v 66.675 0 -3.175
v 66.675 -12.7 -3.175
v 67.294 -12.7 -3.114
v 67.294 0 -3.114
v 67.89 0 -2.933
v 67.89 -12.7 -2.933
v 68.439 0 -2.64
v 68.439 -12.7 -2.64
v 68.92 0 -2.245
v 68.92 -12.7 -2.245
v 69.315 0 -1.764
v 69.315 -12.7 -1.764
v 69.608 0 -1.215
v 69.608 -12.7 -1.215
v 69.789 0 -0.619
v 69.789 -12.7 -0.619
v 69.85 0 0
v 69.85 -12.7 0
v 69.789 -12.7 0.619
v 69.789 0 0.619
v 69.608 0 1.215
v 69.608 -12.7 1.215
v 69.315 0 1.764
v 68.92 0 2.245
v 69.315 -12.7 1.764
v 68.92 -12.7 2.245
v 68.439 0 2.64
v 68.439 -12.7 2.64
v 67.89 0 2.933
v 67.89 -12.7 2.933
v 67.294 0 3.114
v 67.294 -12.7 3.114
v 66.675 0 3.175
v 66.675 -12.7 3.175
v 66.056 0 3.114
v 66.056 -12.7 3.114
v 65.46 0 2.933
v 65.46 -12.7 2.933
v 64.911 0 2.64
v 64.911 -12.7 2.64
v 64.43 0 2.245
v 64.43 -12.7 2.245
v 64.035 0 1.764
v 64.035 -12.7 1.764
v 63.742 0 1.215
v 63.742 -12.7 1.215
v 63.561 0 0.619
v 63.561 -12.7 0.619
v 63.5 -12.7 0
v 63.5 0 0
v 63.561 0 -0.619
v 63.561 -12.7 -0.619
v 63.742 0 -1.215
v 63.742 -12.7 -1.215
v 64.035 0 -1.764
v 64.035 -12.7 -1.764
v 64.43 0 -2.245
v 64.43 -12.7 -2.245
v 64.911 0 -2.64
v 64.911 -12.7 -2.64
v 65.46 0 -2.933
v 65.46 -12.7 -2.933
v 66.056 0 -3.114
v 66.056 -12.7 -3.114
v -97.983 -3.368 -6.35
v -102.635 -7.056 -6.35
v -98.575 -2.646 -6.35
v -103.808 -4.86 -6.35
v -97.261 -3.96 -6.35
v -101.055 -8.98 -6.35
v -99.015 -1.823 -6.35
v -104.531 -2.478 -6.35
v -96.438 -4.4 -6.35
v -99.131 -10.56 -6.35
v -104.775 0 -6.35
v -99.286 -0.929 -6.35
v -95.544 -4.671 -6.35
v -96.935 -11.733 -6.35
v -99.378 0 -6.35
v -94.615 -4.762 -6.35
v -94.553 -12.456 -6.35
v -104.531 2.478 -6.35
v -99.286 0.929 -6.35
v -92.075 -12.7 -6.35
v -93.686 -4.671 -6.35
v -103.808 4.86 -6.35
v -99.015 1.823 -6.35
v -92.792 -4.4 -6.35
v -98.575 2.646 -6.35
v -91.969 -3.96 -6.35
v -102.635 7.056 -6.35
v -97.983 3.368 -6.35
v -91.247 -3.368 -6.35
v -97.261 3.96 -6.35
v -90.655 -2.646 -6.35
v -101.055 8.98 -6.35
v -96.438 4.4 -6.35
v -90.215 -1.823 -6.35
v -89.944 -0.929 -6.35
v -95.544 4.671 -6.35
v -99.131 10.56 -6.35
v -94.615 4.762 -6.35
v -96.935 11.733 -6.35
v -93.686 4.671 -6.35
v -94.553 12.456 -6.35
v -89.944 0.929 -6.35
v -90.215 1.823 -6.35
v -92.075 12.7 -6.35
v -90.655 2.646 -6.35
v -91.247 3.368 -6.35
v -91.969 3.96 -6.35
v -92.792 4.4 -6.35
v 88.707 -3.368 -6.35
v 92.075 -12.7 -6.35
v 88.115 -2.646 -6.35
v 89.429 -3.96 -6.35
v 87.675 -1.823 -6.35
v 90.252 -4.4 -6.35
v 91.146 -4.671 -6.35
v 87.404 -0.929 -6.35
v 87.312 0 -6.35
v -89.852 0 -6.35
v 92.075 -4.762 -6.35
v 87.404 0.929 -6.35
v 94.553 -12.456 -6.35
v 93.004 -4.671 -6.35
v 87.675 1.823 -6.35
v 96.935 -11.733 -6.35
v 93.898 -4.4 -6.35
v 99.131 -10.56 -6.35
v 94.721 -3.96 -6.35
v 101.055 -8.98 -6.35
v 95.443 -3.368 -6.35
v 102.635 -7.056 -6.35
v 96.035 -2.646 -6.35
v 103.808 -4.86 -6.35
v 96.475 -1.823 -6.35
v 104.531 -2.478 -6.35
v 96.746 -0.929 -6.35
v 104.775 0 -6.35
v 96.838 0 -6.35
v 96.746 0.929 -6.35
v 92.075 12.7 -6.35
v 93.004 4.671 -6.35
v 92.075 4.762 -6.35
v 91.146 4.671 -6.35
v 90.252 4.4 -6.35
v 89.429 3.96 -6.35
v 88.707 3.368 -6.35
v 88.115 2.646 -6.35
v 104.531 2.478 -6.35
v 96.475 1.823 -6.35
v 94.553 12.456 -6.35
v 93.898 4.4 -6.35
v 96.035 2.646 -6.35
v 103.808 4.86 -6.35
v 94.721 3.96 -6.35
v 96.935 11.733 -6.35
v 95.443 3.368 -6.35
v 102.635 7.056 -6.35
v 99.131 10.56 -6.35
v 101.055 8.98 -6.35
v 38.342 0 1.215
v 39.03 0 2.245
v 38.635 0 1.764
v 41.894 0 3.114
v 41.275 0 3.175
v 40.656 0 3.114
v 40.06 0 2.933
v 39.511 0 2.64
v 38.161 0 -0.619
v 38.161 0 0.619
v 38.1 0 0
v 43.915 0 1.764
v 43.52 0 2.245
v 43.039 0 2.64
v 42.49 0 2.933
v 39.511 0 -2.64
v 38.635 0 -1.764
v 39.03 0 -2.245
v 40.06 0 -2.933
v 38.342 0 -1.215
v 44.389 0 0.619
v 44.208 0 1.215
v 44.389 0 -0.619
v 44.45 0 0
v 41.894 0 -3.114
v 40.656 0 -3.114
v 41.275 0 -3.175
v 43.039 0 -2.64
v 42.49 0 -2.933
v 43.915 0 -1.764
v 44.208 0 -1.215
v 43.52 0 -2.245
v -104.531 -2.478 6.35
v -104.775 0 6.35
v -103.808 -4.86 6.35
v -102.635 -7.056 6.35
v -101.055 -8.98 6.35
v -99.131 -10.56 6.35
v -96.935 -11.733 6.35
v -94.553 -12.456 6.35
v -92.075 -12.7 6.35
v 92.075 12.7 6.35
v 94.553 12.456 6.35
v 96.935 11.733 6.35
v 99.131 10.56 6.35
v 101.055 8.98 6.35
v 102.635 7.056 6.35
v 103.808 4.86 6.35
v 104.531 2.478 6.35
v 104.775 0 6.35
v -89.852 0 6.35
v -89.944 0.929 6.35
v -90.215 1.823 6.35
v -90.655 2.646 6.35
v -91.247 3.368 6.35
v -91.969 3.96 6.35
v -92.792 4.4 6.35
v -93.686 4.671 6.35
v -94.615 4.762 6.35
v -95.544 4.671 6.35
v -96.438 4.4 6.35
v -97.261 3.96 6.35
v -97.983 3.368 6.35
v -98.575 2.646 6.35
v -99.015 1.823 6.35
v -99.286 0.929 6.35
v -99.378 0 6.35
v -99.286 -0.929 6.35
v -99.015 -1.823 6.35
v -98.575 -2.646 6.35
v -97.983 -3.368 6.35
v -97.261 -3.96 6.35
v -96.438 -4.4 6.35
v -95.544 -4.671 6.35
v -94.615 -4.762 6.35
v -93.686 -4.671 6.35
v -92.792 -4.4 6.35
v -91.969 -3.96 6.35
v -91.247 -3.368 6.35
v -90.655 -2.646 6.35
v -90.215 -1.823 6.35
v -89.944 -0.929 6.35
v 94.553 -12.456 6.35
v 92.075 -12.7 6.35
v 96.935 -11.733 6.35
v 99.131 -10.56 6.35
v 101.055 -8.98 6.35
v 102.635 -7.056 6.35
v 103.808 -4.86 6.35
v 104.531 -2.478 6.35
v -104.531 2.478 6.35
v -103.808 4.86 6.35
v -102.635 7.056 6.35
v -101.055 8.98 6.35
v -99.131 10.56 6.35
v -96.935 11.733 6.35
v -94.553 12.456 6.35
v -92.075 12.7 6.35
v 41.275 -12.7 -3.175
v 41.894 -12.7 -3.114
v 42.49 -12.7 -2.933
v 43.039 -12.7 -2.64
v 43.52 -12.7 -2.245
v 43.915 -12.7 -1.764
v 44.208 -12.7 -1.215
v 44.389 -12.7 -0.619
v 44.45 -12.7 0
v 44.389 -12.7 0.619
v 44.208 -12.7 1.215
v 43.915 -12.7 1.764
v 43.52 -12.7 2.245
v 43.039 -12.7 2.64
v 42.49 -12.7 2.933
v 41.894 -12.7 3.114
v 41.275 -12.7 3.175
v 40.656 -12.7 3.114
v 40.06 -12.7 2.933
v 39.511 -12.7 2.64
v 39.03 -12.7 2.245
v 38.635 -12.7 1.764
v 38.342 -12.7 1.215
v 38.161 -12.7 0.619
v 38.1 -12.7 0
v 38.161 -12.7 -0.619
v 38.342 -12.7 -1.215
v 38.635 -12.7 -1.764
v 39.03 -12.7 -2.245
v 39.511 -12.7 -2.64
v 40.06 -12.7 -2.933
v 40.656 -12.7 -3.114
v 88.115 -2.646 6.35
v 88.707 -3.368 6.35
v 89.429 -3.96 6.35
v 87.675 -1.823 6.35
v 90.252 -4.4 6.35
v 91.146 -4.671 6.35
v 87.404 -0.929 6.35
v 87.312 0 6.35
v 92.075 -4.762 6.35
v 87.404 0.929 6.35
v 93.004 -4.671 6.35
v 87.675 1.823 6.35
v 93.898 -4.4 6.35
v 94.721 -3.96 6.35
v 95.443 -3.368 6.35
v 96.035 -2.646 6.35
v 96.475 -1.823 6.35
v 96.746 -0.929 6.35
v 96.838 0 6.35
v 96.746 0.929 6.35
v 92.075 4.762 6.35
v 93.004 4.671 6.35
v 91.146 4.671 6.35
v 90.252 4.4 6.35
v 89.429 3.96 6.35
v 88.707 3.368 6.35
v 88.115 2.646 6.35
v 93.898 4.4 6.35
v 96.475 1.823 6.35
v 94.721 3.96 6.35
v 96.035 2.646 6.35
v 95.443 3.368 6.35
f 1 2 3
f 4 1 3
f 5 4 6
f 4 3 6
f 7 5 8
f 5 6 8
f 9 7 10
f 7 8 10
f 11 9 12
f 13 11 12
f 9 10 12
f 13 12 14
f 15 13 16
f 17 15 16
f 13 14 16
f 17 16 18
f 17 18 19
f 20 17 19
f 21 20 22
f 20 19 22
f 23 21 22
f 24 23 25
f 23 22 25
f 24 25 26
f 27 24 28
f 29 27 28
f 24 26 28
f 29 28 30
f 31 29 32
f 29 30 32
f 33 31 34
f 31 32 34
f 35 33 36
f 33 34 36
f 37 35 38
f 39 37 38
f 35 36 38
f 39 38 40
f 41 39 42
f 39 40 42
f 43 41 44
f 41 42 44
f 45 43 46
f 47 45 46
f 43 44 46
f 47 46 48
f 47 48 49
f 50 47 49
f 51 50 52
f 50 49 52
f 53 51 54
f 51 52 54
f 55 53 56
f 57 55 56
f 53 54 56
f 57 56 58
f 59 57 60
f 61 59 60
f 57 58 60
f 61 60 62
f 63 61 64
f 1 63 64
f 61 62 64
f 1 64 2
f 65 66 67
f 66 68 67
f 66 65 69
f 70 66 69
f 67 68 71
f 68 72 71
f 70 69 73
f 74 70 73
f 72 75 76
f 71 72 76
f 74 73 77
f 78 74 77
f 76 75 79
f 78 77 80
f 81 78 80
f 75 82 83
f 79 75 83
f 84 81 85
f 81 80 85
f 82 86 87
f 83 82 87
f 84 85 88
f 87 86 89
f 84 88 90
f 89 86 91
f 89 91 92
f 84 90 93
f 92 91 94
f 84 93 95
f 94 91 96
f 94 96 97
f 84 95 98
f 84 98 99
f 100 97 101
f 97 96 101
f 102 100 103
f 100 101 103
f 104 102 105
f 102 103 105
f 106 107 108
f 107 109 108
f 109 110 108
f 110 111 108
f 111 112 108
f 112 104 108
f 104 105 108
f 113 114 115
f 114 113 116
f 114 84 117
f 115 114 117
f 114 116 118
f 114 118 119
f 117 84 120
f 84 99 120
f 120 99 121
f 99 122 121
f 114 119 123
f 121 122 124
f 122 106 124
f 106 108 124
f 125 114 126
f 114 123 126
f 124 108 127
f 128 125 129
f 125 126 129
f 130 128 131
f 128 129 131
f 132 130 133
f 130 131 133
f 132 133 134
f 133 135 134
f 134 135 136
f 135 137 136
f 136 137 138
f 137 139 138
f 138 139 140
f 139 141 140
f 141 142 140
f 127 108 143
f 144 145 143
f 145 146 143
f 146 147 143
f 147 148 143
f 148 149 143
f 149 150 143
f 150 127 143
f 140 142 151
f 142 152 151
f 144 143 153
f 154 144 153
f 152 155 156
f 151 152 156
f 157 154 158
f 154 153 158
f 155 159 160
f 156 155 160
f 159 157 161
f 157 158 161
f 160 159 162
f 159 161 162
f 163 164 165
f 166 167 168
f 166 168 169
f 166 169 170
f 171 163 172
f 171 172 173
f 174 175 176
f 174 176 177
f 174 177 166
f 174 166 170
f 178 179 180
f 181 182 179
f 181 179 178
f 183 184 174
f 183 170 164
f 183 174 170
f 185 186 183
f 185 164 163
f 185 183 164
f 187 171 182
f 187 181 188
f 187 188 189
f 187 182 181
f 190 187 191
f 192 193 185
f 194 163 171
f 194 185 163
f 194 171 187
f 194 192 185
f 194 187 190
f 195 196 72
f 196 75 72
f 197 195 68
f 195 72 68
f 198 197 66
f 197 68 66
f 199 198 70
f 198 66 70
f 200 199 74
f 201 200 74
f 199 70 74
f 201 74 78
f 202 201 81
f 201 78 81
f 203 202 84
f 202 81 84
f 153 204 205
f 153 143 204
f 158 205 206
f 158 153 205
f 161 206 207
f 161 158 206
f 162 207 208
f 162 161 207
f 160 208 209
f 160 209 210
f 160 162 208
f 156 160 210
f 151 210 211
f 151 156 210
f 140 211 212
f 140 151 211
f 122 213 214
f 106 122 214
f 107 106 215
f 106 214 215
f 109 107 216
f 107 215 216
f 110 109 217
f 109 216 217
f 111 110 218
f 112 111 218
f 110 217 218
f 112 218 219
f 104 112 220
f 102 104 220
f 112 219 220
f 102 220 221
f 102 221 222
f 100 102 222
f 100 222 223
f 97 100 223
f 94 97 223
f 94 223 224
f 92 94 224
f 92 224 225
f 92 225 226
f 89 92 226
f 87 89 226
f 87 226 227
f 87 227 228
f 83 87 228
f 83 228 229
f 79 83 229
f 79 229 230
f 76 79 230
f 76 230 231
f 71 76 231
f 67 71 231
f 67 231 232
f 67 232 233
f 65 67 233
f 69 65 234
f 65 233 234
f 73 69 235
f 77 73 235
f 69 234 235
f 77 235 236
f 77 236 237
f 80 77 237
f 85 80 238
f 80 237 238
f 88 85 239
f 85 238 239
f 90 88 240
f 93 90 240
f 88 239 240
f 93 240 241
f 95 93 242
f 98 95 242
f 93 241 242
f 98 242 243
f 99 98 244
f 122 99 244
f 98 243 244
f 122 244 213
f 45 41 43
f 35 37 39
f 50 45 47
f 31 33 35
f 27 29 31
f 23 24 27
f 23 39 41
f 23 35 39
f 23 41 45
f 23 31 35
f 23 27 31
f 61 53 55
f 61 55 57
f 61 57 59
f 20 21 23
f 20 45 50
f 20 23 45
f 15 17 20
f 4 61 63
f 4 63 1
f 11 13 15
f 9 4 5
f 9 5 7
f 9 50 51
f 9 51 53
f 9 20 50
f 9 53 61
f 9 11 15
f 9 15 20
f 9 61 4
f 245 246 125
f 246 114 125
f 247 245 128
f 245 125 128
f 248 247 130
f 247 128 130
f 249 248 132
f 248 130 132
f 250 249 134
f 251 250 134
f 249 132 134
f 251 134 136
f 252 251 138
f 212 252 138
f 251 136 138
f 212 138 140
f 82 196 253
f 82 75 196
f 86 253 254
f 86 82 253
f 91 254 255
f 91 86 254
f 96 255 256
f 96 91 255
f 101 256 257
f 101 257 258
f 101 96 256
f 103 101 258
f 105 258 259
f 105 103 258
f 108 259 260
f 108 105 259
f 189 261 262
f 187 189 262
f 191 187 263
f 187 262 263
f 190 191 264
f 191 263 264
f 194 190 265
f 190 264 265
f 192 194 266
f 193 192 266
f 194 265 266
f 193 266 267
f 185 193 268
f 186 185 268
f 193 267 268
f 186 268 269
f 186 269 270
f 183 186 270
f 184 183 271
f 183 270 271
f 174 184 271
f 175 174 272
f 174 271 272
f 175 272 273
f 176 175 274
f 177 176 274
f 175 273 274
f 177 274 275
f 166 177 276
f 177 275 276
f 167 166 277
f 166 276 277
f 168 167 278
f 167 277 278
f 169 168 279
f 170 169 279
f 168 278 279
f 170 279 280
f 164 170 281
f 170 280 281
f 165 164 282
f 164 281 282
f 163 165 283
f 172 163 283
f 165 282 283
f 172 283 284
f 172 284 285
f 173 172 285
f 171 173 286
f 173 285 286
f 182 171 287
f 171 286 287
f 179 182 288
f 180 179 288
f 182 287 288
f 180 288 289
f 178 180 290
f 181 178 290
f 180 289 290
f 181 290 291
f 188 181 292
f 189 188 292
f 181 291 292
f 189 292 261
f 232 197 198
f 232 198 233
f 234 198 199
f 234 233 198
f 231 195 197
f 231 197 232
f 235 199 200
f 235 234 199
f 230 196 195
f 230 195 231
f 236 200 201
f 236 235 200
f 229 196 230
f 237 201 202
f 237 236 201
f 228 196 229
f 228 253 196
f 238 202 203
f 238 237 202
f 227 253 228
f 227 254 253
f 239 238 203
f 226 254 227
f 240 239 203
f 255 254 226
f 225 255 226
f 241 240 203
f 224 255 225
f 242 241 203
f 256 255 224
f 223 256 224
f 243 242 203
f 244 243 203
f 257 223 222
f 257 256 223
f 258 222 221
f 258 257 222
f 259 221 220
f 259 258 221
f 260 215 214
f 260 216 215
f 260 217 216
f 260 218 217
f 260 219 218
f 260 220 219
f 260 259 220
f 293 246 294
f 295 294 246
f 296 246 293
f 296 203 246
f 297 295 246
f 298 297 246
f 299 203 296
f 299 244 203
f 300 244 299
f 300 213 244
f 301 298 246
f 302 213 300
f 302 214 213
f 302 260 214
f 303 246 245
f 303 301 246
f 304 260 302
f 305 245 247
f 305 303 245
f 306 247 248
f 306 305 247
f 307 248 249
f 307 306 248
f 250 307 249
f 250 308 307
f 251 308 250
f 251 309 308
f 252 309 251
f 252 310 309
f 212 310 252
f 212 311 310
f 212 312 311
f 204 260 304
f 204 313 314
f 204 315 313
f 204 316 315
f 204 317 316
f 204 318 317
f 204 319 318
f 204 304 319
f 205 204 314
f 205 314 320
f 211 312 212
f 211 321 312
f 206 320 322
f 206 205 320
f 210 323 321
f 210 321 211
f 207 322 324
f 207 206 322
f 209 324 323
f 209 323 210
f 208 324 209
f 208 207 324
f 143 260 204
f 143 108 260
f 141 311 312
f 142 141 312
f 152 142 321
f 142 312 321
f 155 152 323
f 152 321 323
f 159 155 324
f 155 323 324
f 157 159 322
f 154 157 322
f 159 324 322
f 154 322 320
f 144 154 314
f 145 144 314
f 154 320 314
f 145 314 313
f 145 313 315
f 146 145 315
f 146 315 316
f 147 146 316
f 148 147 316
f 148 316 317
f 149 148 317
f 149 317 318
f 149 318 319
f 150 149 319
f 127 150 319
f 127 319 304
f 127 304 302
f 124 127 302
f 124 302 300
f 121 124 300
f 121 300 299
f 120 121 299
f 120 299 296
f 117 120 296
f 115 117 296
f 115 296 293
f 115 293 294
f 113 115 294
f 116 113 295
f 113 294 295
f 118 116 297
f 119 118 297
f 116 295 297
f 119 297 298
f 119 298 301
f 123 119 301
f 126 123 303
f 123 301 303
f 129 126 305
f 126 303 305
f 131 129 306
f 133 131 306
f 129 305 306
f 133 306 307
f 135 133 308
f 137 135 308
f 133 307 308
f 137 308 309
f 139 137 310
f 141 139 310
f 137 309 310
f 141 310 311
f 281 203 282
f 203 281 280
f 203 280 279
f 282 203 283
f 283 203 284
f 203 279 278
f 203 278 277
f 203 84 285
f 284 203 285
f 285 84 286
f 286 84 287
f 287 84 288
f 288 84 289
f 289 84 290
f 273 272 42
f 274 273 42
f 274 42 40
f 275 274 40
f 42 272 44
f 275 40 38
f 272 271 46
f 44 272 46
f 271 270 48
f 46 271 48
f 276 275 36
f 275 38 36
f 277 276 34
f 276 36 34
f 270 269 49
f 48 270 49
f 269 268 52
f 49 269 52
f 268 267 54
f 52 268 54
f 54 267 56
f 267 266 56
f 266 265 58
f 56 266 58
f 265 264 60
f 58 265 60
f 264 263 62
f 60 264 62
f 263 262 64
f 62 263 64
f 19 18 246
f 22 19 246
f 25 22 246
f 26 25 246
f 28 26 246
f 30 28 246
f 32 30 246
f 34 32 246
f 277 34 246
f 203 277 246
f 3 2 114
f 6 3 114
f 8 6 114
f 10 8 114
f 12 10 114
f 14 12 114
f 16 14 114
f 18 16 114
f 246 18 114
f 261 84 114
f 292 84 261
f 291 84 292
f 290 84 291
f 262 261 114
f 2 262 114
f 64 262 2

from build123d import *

# Parameters (mm, degrees)
SKETCH1_W           = 209.55
SKETCH1_H           = 12.7
BOSS_EXTRUDE1_DEPTH = 12.7
SKETCH2_R           = 4.7625
CUT_EXTRUDE1_DEPTH  = 107.303248422
FILLET1_R           = 12.7
SKETCH4_R           = 3.175
CUT_EXTRUDE3_DEPTH  = 12.7


with BuildPart() as part:
    # Sketch1 → Boss-Extrude1 (new, symmetric)
    with BuildSketch(Plane(origin=(0, 0, 0), x_dir=(1, 0, 0), z_dir=(0, 1, 0))):
        Rectangle(SKETCH1_W, SKETCH1_H)
    extrude(amount=BOSS_EXTRUDE1_DEPTH, both=True)

    # Sketch2 → Cut-Extrude1 (cut, through all)
    with BuildSketch(Plane.XY.offset(6.35)):
        with Locations((-94.615, 0)):
            Circle(SKETCH2_R)
        with Locations((92.075, 0)):
            Circle(SKETCH2_R)
    extrude(amount=-CUT_EXTRUDE1_DEPTH, mode=Mode.SUBTRACT)

    # Fillet1
    fillet1_edges = [part.edges().sort_by_distance(p)[0] for p in [
        (104.775, -12.7, 0),
        (104.775, 12.7, 0),
        (-104.775, -12.7, 0),
        (-104.775, 12.7, 0),
    ]]
    fillet(fillet1_edges, radius=FILLET1_R - 0.0001)  # a hair under: the kernel refuses the full size

    # Sketch4 → Cut-Extrude3 (cut)
    with BuildSketch(Plane.XZ.offset(12.7)):
        with Locations(Location((41.275, 0, 0), (0, 0, 270))):
            Circle(SKETCH4_R)
        with Locations(Location((66.675, 0, 0), (0, 0, 270))):
            Circle(SKETCH4_R)
    extrude(amount=-CUT_EXTRUDE3_DEPTH, mode=Mode.SUBTRACT)


solid = part.part
